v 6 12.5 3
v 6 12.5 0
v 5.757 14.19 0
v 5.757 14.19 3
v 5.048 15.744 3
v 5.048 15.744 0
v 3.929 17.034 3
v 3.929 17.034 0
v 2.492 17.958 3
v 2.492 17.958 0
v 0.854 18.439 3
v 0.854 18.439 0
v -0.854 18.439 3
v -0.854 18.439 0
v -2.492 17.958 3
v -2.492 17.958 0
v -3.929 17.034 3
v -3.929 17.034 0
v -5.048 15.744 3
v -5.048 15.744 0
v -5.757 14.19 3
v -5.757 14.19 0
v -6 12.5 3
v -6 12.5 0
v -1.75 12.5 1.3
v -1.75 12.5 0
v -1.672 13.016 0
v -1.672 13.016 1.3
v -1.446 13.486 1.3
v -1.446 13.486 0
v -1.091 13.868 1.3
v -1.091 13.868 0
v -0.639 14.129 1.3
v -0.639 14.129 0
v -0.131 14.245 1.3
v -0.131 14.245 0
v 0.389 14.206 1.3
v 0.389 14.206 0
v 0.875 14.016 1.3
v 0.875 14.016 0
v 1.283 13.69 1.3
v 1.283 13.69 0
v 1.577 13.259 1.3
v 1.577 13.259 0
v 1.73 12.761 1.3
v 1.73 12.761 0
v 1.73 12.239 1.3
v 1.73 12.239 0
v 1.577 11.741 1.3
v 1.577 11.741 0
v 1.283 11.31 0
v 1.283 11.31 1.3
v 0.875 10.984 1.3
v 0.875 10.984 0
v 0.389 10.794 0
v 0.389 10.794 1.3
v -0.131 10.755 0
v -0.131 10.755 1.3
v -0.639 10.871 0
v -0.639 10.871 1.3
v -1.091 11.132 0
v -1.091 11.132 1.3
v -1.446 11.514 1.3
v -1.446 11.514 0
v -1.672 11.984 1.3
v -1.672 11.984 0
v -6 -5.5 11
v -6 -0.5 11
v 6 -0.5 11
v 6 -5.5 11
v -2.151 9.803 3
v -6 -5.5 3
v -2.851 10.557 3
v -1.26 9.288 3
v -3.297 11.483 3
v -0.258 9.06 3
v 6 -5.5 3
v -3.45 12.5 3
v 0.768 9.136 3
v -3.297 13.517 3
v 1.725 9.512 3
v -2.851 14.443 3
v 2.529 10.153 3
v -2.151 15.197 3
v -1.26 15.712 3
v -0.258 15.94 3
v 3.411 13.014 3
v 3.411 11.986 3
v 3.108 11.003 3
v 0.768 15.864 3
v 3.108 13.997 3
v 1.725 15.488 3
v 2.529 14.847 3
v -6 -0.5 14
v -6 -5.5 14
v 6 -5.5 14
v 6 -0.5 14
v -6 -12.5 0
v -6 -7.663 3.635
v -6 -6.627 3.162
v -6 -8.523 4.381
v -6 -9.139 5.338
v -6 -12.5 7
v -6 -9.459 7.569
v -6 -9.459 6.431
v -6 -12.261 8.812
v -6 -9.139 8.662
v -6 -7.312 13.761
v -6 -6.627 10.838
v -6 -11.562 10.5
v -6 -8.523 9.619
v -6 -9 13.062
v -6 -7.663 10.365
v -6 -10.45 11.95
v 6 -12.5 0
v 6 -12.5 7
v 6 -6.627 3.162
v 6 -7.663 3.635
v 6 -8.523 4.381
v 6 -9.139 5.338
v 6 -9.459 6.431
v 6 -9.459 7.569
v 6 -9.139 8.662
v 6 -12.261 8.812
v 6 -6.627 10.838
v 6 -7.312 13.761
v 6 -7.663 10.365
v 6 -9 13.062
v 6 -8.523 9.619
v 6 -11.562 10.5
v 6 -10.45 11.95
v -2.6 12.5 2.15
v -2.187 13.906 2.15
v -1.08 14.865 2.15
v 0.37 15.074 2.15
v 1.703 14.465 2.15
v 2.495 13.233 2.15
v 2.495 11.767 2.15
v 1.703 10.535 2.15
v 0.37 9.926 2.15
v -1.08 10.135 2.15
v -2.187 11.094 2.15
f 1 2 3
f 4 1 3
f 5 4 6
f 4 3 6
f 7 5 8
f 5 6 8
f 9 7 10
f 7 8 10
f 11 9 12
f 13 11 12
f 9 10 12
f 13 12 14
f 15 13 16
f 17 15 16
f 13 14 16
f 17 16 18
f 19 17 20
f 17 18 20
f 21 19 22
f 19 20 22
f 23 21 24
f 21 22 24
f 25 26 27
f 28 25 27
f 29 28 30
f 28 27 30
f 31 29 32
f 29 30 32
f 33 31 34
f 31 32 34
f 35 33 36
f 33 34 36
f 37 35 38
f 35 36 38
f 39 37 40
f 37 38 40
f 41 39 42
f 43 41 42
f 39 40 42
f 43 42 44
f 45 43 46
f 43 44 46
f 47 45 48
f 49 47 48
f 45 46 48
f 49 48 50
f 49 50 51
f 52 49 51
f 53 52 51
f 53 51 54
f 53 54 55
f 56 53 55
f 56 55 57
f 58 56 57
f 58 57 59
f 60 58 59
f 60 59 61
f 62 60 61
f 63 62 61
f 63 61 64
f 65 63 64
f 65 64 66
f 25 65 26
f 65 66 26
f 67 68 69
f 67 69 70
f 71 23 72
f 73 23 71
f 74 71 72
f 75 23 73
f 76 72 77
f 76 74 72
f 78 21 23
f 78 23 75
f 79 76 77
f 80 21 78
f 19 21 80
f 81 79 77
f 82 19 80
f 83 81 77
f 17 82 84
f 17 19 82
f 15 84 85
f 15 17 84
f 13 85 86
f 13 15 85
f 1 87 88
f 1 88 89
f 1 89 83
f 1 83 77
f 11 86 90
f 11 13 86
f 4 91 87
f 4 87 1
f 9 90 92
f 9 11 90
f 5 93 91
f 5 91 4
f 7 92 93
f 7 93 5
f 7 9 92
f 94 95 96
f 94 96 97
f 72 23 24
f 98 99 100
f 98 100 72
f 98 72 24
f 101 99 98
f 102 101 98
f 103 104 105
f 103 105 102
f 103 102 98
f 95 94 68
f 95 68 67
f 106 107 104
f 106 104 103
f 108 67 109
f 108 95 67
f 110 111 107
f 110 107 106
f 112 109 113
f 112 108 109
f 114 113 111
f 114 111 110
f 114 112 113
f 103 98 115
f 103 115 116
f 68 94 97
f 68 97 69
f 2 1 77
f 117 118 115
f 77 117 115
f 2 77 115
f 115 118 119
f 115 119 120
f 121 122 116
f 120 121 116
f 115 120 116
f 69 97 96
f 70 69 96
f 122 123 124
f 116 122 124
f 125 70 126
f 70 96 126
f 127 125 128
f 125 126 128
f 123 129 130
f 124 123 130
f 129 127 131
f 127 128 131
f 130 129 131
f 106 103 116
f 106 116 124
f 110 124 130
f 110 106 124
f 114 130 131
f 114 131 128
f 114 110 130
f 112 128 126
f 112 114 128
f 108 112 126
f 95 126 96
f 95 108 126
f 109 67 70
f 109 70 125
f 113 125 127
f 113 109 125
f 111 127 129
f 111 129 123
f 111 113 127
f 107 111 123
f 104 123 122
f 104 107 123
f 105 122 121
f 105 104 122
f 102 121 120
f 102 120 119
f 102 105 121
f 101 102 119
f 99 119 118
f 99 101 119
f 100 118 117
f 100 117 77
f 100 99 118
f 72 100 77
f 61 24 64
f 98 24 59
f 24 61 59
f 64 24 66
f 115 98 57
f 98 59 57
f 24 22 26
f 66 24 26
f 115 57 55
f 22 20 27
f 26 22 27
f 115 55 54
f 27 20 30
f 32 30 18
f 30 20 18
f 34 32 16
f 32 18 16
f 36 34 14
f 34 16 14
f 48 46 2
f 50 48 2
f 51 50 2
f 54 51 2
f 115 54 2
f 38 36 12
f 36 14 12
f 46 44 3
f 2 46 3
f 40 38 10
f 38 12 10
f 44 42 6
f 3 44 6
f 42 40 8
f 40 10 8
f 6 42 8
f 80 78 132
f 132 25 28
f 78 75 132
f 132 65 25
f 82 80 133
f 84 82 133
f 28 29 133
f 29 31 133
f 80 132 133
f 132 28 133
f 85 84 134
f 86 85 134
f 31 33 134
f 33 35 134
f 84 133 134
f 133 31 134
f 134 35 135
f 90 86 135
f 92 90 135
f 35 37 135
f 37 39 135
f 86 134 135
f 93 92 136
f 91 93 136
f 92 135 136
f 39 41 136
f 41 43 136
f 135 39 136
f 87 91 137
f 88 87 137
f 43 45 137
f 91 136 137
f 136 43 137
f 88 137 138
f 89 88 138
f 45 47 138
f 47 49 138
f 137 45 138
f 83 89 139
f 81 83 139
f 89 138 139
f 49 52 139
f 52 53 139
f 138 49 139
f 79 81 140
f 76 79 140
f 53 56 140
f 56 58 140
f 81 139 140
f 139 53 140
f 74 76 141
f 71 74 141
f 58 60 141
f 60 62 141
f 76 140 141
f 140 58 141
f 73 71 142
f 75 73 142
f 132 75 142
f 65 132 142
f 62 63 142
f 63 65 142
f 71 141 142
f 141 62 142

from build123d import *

# Parameters (mm, degrees)
F1_DEPTH = 3
F3_DEPTH = 12
F4_SIZE  = 1.7


with BuildPart() as f1:
    # F0 (on Top) → F1 (new body)
    with BuildSketch(Plane.XY):
        with BuildLine():
            Line((6, -12.5), (6, 12.5))
            ThreePointArc((6, 12.5), (0, 6.5), (-6, 12.5))
            Line((-6, 12.5), (-6, -12.5))
            Line((-6, -12.5), (6, -12.5))
        make_face()
        with BuildLine():
            ThreePointArc((-1.75, 12.5), (0, 14.25), (1.75, 12.5))
            Line((1.75, 12.5), (6, 12.5))
            ThreePointArc((6, 12.5), (0, 18.5), (-6, 12.5))
            Line((-6, 12.5), (-1.75, 12.5))
        make_face()
        with BuildLine():
            Line((6, 12.5), (1.75, 12.5))
            ThreePointArc((1.75, 12.5), (0, 10.75), (-1.75, 12.5))
            Line((-1.75, 12.5), (-6, 12.5))
            ThreePointArc((-6, 12.5), (0, 6.5), (6, 12.5))
        make_face()
    extrude(amount=F1_DEPTH)

    # F2 (on face) → F3 (join, through all)
    with BuildSketch(Plane(origin=(-6, 0, 0), x_dir=(0, -1, 0), z_dir=(-1, 0, 0))):
        with BuildLine():
            Line((12.5, 3), (12.5, 7))
            ThreePointArc((12.5, 7), (10.4497474683, 11.9497474683), (5.5, 14))
            Line((5.5, 14), (0.5, 14))
            Line((0.5, 14), (0.5, 11))
            Line((0.5, 11), (5.5, 11))
            ThreePointArc((5.5, 11), (9.5, 7), (5.5, 3))
            Line((5.5, 3), (12.5, 3))
        make_face()
    extrude(amount=-F3_DEPTH)

    # F4
    f4_edges = [f1.edges().sort_by_distance(p)[0] for p in [
        (1.75, 12.5, 3),
    ]]
    chamfer(f4_edges, length=F4_SIZE)


solid = f1.part
